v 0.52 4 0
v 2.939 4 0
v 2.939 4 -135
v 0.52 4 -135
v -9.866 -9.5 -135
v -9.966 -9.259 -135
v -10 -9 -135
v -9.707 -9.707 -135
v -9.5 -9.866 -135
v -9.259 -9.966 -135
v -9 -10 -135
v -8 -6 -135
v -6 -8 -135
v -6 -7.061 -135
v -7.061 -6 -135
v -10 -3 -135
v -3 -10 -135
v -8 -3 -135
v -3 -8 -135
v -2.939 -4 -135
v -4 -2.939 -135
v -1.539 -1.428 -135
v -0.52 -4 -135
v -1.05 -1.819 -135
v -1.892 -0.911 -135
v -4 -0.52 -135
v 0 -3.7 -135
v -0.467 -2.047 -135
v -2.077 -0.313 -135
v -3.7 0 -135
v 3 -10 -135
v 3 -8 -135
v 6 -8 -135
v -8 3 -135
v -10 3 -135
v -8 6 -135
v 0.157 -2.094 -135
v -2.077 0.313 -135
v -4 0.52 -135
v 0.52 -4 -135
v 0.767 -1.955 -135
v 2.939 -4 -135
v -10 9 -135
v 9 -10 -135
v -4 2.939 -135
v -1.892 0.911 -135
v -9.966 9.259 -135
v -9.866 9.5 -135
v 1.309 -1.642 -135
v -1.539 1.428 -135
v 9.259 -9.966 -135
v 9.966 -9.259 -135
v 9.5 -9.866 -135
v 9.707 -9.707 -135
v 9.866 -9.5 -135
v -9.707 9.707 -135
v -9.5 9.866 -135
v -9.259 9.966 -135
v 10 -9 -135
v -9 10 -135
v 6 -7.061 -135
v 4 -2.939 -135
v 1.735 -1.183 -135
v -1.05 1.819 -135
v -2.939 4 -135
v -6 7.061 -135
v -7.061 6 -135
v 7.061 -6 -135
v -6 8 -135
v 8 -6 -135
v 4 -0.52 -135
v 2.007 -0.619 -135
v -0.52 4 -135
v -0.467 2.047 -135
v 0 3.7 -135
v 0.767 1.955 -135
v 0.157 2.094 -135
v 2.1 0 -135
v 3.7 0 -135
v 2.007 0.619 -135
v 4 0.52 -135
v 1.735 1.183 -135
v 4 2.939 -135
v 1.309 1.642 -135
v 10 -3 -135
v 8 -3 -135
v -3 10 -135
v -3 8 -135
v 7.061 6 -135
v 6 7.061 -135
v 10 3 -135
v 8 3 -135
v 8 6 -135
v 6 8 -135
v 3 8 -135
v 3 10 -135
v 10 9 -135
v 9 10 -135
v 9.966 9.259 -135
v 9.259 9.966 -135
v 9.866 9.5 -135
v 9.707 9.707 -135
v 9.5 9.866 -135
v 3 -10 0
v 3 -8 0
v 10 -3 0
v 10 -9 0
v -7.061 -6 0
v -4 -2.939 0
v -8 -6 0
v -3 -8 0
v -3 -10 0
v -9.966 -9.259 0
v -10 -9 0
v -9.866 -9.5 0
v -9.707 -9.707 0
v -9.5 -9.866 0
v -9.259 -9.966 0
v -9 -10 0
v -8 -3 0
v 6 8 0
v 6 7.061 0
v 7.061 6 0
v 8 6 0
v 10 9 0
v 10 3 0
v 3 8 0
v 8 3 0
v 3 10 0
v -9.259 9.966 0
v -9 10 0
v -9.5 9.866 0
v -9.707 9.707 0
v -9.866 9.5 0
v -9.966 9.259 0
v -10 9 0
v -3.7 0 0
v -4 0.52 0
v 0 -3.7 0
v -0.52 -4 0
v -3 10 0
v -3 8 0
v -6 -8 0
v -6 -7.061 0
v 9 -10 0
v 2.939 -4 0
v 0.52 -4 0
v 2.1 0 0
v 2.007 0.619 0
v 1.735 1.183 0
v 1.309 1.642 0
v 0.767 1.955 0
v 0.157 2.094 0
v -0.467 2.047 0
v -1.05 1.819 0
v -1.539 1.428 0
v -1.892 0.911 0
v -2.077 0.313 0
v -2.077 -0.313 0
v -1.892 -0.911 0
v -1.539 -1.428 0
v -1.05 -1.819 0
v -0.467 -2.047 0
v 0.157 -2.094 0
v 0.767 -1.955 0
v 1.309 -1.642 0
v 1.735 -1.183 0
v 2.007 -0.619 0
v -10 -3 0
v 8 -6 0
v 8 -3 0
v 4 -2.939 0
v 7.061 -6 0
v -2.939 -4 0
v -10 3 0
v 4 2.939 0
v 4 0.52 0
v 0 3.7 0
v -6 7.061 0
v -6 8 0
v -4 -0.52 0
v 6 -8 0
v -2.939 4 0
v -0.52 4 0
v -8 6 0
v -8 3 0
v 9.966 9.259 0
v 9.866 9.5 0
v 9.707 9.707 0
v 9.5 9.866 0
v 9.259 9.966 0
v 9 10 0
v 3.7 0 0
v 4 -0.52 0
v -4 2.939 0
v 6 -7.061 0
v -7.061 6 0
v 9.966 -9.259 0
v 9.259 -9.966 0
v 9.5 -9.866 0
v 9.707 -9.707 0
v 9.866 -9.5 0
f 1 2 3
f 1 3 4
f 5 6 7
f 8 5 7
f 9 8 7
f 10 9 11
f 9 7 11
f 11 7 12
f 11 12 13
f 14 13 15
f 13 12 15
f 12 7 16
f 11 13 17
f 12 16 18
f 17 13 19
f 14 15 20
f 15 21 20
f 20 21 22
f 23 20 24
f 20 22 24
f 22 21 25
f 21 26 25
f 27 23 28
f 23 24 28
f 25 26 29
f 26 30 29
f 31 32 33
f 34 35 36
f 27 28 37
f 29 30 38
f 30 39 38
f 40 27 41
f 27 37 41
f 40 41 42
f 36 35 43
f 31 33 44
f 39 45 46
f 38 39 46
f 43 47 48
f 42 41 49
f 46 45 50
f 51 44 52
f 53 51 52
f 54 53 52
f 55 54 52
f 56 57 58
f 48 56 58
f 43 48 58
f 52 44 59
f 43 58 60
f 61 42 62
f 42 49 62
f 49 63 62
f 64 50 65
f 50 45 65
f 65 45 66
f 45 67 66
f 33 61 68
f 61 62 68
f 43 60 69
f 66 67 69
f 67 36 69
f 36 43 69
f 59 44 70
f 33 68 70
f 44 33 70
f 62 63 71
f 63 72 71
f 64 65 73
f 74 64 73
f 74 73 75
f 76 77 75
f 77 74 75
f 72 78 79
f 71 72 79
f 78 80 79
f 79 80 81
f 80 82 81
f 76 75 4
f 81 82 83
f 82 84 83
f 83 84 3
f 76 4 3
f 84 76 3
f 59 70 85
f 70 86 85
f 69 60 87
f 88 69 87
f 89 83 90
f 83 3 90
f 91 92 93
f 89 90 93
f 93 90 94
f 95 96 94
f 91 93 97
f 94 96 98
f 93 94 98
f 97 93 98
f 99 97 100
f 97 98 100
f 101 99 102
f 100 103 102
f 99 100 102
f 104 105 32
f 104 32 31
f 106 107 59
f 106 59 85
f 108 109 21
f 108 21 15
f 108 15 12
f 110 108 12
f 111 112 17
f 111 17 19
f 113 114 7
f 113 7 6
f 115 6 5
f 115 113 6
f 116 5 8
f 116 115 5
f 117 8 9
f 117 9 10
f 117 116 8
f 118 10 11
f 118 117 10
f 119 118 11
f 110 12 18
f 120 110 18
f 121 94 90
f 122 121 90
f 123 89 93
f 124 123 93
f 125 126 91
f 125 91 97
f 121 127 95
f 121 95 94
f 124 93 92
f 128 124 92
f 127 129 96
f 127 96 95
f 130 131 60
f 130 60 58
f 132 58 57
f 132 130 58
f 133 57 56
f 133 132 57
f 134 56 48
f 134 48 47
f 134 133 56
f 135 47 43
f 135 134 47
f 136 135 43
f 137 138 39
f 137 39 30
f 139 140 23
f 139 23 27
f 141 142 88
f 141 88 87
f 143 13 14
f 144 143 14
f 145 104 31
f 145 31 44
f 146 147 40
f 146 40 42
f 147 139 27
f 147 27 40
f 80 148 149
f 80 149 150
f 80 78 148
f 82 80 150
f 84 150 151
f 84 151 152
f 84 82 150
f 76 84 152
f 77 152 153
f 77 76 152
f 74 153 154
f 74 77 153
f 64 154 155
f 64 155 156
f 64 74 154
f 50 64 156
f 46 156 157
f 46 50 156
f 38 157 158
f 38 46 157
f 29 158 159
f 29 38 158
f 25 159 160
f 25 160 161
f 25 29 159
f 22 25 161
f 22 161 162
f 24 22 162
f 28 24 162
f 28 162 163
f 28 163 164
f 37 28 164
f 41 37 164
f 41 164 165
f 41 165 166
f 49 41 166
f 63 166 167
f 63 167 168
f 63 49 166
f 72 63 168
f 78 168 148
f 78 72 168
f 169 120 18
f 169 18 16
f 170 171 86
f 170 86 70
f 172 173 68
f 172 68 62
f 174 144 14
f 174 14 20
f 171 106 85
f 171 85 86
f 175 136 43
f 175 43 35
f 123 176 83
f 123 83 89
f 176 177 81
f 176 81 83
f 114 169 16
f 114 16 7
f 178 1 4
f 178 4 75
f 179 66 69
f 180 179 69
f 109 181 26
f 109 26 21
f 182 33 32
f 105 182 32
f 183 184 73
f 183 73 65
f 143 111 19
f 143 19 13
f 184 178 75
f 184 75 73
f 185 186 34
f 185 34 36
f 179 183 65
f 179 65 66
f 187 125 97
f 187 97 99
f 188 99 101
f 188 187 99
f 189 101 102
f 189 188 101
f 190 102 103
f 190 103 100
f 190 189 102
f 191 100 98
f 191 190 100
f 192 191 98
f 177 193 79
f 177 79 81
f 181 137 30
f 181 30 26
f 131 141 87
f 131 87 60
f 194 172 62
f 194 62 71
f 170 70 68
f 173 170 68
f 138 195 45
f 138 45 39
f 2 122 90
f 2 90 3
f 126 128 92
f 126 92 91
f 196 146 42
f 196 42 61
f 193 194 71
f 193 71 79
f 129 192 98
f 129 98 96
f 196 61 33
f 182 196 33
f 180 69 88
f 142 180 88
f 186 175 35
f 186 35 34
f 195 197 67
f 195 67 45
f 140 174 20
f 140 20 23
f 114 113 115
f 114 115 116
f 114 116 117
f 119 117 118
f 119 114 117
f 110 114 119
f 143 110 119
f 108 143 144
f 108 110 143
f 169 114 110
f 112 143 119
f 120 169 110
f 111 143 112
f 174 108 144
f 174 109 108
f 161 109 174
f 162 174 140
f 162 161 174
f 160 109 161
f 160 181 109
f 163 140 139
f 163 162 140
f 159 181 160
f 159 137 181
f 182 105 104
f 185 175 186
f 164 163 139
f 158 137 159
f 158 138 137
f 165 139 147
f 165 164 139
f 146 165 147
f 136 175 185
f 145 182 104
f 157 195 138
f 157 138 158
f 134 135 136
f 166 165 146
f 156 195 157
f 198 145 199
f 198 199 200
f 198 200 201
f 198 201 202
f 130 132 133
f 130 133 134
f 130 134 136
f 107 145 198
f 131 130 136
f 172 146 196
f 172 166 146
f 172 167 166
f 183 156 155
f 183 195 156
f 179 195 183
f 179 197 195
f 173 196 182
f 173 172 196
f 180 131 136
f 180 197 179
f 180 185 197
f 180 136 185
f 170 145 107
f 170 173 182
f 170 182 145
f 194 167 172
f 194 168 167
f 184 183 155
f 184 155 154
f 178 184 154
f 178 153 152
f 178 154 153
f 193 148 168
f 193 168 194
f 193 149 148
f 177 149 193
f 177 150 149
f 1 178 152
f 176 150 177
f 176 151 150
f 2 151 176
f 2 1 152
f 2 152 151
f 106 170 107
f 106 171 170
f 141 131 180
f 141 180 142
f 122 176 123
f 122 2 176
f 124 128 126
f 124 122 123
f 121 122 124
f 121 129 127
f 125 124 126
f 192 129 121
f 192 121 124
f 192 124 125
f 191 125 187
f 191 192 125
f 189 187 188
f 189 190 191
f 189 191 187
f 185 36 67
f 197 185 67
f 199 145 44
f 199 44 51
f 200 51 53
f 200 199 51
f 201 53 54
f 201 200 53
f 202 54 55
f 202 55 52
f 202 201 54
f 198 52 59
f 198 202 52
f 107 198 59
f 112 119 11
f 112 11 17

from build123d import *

# Parameters (mm, degrees)
BOSS_EXTRUDE1_DEPTH = 135
SKETCH2_W           = 135
SKETCH2_H           = 2.1


with BuildPart() as part:
    # Sketch1 → Boss-Extrude1 (new body)
    with BuildSketch(Plane.XY):
        with BuildLine():
            Line((-10, -3), (-10, -9))
            ThreePointArc((-10, -9), (-9.707106781, -9.707106781), (-9, -10))
            Line((-9, -10), (-3, -10))
            Line((-3, -10), (-3, -8))
            Line((-3, -8), (-6, -8))
            Line((-6, -8), (-6, -7.060660172))
            Line((-6, -7.060660172), (-2.939339828, -4))
            Line((-2.939339828, -4), (-0.519615242, -4))
            Line((-0.519615242, -4), (0, -3.7))
            Line((0, -3.7), (0.519615242, -4))
            Line((0.519615242, -4), (2.939339828, -4))
            Line((2.939339828, -4), (6, -7.060660172))
            Line((6, -7.060660172), (6, -8))
            Line((6, -8), (3, -8))
            Line((3, -8), (3, -10))
            Line((3, -10), (9, -10))
            ThreePointArc((9, -10), (9.707106781, -9.707106781), (10, -9))
            Line((10, -9), (10, -3))
            Line((10, -3), (8, -3))
            Line((8, -3), (8, -6))
            Line((8, -6), (7.060660172, -6))
            Line((7.060660172, -6), (4, -2.939339828))
            Line((4, -2.939339828), (4, -0.519615242))
            Line((4, -0.519615242), (3.7, 0))
            Line((3.7, 0), (4, 0.519615242))
            Line((4, 0.519615242), (4, 2.939339828))
            Line((4, 2.939339828), (7.060660172, 6))
            Line((7.060660172, 6), (8, 6))
            Line((8, 6), (8, 3))
            Line((8, 3), (10, 3))
            Line((10, 3), (10, 9))
            ThreePointArc((10, 9), (9.707106781, 9.707106781), (9, 10))
            Line((9, 10), (3, 10))
            Line((3, 10), (3, 8))
            Line((3, 8), (6, 8))
            Line((6, 8), (6, 7.060660172))
            Line((6, 7.060660172), (2.939339828, 4))
            Line((2.939339828, 4), (0.519615242, 4))
            Line((0.519615242, 4), (0, 3.7))
            Line((0, 3.7), (-0.519615242, 4))
            Line((-0.519615242, 4), (-2.939339828, 4))
            Line((-2.939339828, 4), (-6, 7.060660172))
            Line((-6, 7.060660172), (-6, 8))
            Line((-6, 8), (-3, 8))
            Line((-3, 8), (-3, 10))
            Line((-3, 10), (-9, 10))
            ThreePointArc((-9, 10), (-9.707106781, 9.707106781), (-10, 9))
            Line((-10, 9), (-10, 3))
            Line((-10, 3), (-8, 3))
            Line((-8, 3), (-8, 6))
            Line((-8, 6), (-7.060660172, 6))
            Line((-7.060660172, 6), (-4, 2.939339828))
            Line((-4, 2.939339828), (-4, 0.519615242))
            Line((-4, 0.519615242), (-3.7, 0))
            Line((-3.7, 0), (-4, -0.519615242))
            Line((-4, -0.519615242), (-4, -2.939339828))
            Line((-4, -2.939339828), (-7.060660172, -6))
            Line((-7.060660172, -6), (-8, -6))
            Line((-8, -6), (-8, -3))
            Line((-8, -3), (-10, -3))
        make_face()
    extrude(amount=-BOSS_EXTRUDE1_DEPTH)

    # Sketch2 → Cut-Revolve1 (revolve, cut)
    with BuildSketch(Plane(origin=(0, 0, 0), x_dir=(0, 0, -1), z_dir=(1, 0, 0)), mode=Mode.PRIVATE) as cut_revolve1_sk:
        with Locations((67.5, 1.05)):
            Rectangle(SKETCH2_W, SKETCH2_H)
    revolve(cut_revolve1_sk.sketch.rotate(Axis((0, 0, -135), (0, 0, 1)), 270), axis=Axis((0, 0, -135), (0, 0, 1)), mode=Mode.SUBTRACT)


solid = part.part
